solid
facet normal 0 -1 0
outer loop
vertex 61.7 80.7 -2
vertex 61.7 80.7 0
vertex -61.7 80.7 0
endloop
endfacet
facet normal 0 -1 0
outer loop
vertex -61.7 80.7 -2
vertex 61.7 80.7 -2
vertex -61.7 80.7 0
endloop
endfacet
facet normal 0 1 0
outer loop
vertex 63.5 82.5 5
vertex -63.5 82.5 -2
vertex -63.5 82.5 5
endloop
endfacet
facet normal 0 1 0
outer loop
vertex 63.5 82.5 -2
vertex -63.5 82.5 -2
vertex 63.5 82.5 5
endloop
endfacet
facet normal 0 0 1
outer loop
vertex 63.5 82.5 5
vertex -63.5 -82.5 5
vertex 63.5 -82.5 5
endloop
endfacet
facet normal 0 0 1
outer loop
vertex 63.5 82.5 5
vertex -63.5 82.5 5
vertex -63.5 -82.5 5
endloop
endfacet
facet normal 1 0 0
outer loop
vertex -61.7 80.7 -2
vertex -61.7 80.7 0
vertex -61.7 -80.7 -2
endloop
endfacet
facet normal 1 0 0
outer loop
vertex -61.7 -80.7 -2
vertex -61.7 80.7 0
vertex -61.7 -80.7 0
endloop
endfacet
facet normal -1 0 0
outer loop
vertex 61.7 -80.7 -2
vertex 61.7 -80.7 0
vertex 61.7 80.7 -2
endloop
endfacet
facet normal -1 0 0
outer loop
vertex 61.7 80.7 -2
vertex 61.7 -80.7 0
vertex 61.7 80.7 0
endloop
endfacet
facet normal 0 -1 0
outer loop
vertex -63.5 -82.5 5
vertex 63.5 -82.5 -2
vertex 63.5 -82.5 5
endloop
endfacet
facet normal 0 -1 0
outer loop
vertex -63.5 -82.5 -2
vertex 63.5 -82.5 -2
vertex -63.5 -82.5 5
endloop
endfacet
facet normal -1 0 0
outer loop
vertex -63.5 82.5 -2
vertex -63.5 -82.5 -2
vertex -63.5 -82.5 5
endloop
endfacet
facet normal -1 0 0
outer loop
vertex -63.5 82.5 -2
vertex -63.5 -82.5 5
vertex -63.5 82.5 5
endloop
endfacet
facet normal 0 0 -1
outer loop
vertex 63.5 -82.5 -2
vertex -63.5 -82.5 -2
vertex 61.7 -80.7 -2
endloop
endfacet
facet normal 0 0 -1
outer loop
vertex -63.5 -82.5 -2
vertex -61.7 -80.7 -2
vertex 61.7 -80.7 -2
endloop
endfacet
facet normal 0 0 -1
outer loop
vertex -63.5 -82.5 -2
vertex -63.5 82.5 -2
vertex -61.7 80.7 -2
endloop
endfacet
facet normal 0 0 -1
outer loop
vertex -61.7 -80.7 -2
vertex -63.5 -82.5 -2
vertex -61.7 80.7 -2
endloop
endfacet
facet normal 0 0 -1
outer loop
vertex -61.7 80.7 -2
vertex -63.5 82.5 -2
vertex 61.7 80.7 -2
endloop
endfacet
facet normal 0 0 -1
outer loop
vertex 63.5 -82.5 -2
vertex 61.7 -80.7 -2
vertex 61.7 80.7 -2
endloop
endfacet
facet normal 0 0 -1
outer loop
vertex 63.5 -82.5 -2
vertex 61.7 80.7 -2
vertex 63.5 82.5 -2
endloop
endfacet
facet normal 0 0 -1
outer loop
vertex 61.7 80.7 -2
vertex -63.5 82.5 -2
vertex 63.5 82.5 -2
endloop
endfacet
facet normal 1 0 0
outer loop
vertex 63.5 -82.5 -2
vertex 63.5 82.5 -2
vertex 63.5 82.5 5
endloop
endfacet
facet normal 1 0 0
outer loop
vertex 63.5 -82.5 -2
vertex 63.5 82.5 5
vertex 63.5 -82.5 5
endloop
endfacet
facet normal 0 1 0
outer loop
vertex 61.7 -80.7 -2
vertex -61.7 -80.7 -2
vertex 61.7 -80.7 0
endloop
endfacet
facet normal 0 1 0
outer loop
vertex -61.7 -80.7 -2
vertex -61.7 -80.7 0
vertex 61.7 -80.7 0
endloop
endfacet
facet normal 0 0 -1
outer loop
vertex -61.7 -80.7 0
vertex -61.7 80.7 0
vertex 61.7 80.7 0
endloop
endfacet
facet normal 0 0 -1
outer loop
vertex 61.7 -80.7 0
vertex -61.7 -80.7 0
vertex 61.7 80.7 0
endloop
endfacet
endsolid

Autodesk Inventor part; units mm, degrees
ref_plane "YZ Plane" through (0, 0, 0) normal (1, 0, 0) x (0, 1, 0)
ref_plane "XZ Plane" through (0, 0, 0) normal (0, 1, 0) x (-1, 0, 0)
ref_plane "XY Plane" through (0, 0, 0) normal (0, 0, 1) x (1, 0, 0)
sketch "Эскиз1" plane through (0, 0, 0) normal (0, 0, 1) x (1, 0, 0)
  line L0 (63.5, -82.5) -> (-63.5, -82.5) projected
  line L1 (-63.5, -82.5) -> (-63.5, 82.5) projected
  line L2 (63.5, 82.5) -> (63.5, -82.5) projected
  line L3 (-63.5, 82.5) -> (63.5, 82.5) projected
  point P0 (0, 0)
extrude "Выдавливание1" add sketch "Эскиз1" along normal blind 5
sketch "Эскиз2" plane through (0, 0, 0) normal (0, 0, 1) x (1, 0, 0)
  line L0 (-63.5, -82.5) -> (-63.5, 82.5) projected
  line L1 (-63.5, 82.5) -> (63.5, 82.5) projected
  line L2 (63.5, 82.5) -> (63.5, -82.5) projected
  line L3 (63.5, -82.5) -> (-63.5, -82.5) projected
  line L4 (-61.7, 80.7) -> (-61.7, -80.7)
  line L5 (-61.7, -80.7) -> (61.7, -80.7)
  line L6 (61.7, -80.7) -> (61.7, 80.7)
  line L7 (61.7, 80.7) -> (-61.7, 80.7)
  point P0 (0, 0)
  dimension "d2" = 1.8
extrude "Выдавливание2" add sketch "Эскиз2" against normal blind 2
properties part number "Крышка контейнера"
